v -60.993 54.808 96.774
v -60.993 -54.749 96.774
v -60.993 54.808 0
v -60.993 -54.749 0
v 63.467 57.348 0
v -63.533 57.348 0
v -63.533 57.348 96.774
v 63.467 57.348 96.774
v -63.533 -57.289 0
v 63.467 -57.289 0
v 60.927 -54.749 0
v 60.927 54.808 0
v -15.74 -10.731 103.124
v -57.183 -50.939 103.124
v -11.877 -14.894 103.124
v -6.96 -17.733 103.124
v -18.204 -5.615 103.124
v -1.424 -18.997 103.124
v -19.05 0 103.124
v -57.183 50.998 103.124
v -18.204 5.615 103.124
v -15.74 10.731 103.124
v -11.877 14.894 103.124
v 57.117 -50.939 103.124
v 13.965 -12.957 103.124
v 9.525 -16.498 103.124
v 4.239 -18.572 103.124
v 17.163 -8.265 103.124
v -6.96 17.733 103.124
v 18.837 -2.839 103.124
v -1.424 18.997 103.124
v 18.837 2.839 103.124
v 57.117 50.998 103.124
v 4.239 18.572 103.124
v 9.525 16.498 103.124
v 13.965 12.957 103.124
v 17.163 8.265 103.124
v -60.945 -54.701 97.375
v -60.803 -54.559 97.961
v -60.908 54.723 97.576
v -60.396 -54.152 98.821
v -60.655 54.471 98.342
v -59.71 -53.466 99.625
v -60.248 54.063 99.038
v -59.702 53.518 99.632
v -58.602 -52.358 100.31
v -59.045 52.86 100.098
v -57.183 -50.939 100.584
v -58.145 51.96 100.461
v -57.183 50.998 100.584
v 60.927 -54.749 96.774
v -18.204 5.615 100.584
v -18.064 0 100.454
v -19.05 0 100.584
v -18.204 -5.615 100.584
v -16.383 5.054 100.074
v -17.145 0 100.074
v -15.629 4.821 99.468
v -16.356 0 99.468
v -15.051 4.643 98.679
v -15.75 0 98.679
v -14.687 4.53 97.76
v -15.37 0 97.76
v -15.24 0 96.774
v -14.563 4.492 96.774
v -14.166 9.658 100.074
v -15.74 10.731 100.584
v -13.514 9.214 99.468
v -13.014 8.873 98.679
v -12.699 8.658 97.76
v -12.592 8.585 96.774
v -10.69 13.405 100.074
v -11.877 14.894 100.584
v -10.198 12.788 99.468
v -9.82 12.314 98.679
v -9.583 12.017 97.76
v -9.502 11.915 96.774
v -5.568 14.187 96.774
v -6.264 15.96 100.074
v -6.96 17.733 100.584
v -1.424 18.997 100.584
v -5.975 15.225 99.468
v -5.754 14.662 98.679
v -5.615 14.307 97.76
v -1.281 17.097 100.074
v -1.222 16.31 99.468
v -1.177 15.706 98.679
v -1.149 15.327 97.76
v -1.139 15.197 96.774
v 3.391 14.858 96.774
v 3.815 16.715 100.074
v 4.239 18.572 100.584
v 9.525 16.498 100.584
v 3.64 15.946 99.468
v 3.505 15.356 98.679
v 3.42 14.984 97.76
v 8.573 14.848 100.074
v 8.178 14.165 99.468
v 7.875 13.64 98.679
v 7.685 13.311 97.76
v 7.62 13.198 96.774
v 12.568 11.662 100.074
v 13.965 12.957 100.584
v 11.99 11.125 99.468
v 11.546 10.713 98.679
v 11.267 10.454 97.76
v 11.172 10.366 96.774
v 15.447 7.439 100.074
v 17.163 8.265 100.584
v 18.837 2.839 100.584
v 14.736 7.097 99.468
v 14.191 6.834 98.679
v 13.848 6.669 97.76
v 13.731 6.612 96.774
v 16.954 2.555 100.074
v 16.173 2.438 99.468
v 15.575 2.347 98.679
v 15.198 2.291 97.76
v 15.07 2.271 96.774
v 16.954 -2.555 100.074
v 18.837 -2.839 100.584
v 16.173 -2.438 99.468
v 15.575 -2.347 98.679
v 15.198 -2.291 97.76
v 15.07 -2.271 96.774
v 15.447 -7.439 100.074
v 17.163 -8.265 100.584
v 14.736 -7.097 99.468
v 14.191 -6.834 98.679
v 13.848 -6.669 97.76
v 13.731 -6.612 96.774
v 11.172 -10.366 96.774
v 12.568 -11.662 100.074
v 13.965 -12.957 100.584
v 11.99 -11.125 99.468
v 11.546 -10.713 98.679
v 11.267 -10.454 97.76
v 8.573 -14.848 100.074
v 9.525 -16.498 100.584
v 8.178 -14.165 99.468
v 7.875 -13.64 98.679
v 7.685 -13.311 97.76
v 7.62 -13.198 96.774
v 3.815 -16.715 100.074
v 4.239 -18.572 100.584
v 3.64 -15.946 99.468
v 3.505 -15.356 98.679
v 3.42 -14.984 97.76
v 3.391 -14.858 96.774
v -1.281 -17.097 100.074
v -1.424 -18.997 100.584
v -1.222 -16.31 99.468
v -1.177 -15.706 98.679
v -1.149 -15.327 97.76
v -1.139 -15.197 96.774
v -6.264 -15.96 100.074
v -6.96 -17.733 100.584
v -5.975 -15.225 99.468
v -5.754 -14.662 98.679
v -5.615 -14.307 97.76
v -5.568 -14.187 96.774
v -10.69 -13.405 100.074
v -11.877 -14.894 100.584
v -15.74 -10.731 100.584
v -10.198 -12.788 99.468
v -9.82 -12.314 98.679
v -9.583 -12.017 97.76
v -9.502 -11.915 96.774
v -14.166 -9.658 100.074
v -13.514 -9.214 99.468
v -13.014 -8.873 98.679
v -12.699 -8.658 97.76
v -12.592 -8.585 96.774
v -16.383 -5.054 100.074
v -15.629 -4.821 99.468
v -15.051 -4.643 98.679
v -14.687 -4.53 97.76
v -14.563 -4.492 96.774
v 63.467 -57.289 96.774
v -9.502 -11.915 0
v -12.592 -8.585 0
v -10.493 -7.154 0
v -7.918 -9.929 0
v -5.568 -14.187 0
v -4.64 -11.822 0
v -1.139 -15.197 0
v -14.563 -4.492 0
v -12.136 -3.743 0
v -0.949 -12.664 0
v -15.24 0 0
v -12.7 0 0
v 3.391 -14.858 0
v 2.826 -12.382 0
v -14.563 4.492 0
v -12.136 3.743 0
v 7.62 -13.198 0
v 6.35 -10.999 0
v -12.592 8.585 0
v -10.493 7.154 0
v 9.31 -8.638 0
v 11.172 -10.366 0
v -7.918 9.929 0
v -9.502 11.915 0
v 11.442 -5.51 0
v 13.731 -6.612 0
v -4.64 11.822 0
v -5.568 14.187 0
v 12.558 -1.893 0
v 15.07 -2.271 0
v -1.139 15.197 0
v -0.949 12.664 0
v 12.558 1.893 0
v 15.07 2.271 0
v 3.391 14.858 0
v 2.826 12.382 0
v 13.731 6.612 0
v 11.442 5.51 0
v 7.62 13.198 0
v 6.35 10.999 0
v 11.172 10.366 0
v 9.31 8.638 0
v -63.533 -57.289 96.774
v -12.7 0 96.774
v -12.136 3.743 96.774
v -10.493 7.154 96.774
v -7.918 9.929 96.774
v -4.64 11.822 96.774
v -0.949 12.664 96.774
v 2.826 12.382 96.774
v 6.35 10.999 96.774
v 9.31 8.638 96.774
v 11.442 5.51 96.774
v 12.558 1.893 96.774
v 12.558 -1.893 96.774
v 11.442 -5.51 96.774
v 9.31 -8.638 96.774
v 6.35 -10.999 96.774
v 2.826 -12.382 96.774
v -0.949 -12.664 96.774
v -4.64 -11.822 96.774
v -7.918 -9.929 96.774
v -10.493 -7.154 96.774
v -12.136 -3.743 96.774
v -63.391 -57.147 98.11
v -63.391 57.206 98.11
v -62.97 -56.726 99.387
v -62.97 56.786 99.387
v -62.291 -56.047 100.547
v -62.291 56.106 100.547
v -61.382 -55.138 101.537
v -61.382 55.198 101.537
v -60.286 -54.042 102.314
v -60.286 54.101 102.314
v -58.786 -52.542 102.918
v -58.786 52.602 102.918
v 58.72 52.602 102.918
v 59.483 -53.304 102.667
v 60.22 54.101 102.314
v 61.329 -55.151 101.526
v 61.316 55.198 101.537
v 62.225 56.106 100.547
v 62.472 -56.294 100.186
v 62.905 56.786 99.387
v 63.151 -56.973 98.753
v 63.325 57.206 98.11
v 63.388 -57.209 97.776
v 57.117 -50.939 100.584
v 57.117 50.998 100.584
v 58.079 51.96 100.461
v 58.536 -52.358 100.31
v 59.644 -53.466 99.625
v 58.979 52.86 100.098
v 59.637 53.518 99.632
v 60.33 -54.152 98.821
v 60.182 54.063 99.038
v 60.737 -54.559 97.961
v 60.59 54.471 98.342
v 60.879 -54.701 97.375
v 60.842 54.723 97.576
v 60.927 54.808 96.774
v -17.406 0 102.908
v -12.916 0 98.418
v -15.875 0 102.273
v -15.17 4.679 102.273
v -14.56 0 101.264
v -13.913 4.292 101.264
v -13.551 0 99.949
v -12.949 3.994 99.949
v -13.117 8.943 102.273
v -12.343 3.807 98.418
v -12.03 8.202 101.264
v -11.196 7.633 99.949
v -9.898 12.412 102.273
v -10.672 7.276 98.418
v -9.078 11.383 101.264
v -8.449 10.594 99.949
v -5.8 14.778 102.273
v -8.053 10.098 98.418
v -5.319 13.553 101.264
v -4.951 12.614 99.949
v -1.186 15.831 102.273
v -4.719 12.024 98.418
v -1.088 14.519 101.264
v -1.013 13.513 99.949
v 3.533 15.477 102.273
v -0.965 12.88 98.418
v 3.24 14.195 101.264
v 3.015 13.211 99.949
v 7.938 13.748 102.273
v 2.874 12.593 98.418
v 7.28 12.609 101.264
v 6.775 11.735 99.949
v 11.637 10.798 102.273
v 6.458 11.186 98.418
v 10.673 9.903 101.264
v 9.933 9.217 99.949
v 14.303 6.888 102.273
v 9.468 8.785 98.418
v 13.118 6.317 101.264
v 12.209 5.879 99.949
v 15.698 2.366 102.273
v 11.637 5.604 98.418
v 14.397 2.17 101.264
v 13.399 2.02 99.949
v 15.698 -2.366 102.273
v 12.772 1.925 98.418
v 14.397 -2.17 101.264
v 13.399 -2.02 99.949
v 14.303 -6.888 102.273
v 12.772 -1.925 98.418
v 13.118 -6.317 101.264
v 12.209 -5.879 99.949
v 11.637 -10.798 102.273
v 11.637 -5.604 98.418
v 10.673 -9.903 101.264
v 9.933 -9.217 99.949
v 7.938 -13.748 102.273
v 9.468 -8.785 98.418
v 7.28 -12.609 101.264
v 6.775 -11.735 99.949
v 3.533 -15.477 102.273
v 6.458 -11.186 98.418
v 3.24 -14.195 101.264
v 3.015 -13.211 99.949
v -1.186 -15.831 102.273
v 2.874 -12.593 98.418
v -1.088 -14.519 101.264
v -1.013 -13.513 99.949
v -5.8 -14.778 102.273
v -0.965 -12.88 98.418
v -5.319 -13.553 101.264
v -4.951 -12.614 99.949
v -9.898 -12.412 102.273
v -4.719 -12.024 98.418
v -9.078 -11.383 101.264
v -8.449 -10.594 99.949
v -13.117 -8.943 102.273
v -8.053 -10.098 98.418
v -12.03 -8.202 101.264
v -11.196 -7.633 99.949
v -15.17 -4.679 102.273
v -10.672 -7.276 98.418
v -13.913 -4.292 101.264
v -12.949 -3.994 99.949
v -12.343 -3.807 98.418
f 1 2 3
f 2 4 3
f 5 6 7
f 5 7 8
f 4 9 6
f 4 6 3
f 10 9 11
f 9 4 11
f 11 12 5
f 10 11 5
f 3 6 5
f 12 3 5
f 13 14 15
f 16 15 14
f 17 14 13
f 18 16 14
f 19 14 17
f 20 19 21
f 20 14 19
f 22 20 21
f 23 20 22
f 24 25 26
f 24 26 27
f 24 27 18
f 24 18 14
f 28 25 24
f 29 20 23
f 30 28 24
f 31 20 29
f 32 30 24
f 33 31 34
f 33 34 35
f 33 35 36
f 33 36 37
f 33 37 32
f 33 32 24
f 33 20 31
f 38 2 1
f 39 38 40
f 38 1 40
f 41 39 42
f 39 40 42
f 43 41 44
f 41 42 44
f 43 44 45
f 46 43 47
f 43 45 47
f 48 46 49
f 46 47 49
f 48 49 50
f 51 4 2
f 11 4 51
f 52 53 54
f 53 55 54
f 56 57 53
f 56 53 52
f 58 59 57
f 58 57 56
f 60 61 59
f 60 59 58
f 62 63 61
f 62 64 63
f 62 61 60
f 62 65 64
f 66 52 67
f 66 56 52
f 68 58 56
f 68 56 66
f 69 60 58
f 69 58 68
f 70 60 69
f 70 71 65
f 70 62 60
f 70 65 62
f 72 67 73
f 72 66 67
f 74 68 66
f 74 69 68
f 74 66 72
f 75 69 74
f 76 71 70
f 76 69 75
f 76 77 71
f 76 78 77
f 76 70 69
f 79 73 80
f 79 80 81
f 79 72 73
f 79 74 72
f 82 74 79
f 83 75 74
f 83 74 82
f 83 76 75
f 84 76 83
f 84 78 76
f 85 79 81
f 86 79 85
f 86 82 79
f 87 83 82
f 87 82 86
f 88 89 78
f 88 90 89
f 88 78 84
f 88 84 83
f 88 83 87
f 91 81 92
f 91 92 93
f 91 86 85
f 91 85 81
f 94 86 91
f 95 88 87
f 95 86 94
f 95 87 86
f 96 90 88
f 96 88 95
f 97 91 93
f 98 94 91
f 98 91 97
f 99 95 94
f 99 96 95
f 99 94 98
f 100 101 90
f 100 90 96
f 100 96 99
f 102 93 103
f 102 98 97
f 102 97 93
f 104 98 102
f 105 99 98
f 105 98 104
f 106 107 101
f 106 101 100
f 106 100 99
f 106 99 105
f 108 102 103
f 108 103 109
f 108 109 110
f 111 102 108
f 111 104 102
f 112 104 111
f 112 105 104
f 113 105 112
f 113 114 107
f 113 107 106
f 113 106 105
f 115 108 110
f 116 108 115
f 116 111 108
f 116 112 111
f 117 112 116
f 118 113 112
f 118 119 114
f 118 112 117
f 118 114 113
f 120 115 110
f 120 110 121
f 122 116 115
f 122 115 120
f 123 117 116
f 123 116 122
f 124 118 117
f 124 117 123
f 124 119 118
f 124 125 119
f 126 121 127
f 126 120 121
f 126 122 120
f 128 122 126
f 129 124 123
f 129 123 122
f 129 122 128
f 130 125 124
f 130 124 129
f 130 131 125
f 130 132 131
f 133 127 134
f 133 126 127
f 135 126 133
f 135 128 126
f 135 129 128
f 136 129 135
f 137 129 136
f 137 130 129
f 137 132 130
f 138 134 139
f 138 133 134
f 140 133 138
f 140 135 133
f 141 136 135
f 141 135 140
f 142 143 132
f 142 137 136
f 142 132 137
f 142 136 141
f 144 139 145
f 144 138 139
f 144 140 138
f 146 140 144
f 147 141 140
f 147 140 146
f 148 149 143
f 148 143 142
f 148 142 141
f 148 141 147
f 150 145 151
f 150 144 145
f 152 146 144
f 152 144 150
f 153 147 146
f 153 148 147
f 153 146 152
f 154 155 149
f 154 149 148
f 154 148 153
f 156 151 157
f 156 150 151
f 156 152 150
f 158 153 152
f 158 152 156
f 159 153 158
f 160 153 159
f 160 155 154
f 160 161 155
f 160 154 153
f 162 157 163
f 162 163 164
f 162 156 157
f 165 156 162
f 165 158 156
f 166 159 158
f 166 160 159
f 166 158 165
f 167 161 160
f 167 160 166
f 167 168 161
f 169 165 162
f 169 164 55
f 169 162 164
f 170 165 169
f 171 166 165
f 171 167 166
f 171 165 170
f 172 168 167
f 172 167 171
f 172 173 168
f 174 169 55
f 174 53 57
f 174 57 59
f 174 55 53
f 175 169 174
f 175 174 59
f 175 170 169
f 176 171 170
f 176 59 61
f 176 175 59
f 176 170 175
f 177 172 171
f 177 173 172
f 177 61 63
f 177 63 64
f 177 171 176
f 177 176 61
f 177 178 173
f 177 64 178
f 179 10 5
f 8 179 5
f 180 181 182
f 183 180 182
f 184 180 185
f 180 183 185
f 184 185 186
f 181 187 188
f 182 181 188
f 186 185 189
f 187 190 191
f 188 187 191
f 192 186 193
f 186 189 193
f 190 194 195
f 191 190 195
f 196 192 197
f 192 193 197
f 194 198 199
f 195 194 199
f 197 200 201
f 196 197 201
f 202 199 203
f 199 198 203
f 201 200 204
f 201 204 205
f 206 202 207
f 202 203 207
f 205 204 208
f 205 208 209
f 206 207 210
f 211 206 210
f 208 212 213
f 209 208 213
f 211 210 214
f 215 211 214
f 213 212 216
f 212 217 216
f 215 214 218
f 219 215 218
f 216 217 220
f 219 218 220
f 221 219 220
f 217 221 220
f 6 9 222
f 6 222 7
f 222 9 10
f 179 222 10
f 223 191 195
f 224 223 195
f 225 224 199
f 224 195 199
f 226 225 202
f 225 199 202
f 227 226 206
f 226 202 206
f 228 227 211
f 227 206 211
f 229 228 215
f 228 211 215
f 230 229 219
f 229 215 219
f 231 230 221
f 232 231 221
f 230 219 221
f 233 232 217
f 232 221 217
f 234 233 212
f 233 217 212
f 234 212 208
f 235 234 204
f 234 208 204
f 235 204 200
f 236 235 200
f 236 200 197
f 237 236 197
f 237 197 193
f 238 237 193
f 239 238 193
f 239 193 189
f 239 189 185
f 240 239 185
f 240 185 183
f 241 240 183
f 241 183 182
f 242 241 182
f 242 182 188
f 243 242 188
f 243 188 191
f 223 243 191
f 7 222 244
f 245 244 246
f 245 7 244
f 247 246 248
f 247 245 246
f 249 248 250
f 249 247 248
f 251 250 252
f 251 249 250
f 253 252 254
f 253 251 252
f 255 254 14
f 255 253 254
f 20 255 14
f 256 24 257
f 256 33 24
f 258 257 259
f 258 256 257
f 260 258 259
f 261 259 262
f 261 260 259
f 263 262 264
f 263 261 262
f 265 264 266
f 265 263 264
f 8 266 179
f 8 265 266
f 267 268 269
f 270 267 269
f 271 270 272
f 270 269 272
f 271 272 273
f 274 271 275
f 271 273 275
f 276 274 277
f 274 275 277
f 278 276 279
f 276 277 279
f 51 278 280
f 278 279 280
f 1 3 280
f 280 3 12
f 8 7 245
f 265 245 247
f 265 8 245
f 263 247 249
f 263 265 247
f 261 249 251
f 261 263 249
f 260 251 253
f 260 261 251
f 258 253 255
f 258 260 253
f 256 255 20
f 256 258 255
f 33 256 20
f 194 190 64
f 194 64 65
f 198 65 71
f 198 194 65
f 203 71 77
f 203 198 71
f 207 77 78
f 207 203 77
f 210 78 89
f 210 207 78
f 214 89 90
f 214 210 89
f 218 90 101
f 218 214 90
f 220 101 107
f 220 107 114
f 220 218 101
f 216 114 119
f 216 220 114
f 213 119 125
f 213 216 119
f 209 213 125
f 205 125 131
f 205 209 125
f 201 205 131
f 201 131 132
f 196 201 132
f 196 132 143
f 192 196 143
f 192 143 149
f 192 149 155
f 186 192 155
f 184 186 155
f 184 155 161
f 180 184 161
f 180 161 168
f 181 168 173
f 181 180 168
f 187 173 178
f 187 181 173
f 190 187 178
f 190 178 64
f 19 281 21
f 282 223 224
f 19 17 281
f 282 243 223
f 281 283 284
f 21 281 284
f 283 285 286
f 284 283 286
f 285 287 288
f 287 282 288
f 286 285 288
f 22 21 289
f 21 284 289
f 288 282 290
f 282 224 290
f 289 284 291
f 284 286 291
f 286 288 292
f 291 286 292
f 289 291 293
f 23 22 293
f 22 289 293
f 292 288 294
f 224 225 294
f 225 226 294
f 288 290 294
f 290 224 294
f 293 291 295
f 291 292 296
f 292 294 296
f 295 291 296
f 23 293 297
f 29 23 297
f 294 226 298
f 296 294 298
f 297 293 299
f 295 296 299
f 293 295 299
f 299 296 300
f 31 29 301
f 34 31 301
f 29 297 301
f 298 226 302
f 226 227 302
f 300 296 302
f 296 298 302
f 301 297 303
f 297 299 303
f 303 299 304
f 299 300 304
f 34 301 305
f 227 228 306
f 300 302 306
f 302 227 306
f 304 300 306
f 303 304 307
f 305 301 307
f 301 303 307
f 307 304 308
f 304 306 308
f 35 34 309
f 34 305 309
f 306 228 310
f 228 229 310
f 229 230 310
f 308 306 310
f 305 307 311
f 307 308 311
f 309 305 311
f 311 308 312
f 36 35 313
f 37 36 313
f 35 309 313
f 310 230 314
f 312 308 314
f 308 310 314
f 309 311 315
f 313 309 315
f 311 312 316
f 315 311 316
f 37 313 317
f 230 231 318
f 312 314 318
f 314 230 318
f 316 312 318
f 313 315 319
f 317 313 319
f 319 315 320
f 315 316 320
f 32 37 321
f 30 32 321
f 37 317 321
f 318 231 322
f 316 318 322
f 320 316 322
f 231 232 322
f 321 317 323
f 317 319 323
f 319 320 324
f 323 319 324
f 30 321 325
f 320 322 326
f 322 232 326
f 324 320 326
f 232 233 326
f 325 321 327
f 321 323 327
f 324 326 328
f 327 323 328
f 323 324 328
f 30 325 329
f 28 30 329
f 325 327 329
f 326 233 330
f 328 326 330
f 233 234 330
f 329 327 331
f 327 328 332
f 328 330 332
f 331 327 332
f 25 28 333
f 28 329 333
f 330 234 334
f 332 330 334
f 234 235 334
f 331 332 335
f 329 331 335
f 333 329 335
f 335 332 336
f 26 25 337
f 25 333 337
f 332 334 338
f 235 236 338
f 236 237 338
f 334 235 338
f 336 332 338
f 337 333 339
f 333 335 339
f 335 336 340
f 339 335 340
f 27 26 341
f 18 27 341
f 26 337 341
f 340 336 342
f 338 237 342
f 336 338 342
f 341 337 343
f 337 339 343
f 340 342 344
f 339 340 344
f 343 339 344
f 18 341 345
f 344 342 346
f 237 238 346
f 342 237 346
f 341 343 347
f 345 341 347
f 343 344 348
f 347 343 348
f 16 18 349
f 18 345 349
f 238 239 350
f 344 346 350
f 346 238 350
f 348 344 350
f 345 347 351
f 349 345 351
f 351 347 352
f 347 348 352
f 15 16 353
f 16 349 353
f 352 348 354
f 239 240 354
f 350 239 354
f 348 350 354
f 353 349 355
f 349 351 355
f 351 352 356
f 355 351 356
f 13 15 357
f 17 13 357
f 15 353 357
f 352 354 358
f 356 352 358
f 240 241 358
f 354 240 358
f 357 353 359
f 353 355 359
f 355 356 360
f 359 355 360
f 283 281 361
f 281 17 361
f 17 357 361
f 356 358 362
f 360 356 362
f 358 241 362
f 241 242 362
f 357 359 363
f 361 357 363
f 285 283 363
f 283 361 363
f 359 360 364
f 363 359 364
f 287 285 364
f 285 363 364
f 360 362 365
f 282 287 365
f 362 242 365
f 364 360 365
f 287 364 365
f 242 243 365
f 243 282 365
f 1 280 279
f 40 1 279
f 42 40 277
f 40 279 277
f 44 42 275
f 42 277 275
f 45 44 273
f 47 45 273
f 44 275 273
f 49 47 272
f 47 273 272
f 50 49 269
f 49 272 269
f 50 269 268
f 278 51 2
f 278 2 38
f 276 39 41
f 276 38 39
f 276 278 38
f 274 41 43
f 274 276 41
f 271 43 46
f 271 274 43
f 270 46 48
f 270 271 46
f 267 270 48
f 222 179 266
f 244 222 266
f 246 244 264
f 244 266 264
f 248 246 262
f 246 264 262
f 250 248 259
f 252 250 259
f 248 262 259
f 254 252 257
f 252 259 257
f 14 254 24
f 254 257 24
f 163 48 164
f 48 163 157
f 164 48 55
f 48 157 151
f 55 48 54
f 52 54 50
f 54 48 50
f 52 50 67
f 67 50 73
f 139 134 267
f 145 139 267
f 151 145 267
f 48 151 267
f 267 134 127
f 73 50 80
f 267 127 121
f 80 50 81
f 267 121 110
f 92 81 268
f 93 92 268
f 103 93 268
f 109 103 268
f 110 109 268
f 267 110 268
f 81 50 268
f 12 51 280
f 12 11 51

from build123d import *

# Parameters (mm, degrees)
F0_W     = 127
F0_H     = 114.6371724766
F1_DEPTH = 103.124
F3_D     = 25.4
F4_R     = 6.35
F5_T     = -2.54


with BuildPart() as f1:
    # F0 (on Top) → F1 (new body)
    with BuildSketch(Plane.XY):
        with Locations((-0.032884495, 0.0296833506)):
            Rectangle(F0_W, F0_H)
    extrude(amount=F1_DEPTH)

    # F3 (through all)
    with Locations(Plane.XY.offset(103.124)):
        with Locations((0, 0)):
            Hole(F3_D / 2)

    # F4
    f4_edges = [f1.edges().sort_by_distance(p)[0] for p in [
        (-0.032884, 57.34827, 103.124),
        (63.467116, 0.029683, 103.124),
        (-63.532884, 0.029683, 103.124),
        (-0.032884, -57.288903, 103.124),
        (-12.7, 0, 103.124),
    ]]
    fillet(f4_edges, radius=F4_R)

    # F5
    f5_openings = [f1.faces().sort_by_distance(p)[0] for p in [
        (-0.032884, 55.637402, 0),
    ]]
    offset(amount=F5_T, openings=f5_openings)


solid = f1.part
